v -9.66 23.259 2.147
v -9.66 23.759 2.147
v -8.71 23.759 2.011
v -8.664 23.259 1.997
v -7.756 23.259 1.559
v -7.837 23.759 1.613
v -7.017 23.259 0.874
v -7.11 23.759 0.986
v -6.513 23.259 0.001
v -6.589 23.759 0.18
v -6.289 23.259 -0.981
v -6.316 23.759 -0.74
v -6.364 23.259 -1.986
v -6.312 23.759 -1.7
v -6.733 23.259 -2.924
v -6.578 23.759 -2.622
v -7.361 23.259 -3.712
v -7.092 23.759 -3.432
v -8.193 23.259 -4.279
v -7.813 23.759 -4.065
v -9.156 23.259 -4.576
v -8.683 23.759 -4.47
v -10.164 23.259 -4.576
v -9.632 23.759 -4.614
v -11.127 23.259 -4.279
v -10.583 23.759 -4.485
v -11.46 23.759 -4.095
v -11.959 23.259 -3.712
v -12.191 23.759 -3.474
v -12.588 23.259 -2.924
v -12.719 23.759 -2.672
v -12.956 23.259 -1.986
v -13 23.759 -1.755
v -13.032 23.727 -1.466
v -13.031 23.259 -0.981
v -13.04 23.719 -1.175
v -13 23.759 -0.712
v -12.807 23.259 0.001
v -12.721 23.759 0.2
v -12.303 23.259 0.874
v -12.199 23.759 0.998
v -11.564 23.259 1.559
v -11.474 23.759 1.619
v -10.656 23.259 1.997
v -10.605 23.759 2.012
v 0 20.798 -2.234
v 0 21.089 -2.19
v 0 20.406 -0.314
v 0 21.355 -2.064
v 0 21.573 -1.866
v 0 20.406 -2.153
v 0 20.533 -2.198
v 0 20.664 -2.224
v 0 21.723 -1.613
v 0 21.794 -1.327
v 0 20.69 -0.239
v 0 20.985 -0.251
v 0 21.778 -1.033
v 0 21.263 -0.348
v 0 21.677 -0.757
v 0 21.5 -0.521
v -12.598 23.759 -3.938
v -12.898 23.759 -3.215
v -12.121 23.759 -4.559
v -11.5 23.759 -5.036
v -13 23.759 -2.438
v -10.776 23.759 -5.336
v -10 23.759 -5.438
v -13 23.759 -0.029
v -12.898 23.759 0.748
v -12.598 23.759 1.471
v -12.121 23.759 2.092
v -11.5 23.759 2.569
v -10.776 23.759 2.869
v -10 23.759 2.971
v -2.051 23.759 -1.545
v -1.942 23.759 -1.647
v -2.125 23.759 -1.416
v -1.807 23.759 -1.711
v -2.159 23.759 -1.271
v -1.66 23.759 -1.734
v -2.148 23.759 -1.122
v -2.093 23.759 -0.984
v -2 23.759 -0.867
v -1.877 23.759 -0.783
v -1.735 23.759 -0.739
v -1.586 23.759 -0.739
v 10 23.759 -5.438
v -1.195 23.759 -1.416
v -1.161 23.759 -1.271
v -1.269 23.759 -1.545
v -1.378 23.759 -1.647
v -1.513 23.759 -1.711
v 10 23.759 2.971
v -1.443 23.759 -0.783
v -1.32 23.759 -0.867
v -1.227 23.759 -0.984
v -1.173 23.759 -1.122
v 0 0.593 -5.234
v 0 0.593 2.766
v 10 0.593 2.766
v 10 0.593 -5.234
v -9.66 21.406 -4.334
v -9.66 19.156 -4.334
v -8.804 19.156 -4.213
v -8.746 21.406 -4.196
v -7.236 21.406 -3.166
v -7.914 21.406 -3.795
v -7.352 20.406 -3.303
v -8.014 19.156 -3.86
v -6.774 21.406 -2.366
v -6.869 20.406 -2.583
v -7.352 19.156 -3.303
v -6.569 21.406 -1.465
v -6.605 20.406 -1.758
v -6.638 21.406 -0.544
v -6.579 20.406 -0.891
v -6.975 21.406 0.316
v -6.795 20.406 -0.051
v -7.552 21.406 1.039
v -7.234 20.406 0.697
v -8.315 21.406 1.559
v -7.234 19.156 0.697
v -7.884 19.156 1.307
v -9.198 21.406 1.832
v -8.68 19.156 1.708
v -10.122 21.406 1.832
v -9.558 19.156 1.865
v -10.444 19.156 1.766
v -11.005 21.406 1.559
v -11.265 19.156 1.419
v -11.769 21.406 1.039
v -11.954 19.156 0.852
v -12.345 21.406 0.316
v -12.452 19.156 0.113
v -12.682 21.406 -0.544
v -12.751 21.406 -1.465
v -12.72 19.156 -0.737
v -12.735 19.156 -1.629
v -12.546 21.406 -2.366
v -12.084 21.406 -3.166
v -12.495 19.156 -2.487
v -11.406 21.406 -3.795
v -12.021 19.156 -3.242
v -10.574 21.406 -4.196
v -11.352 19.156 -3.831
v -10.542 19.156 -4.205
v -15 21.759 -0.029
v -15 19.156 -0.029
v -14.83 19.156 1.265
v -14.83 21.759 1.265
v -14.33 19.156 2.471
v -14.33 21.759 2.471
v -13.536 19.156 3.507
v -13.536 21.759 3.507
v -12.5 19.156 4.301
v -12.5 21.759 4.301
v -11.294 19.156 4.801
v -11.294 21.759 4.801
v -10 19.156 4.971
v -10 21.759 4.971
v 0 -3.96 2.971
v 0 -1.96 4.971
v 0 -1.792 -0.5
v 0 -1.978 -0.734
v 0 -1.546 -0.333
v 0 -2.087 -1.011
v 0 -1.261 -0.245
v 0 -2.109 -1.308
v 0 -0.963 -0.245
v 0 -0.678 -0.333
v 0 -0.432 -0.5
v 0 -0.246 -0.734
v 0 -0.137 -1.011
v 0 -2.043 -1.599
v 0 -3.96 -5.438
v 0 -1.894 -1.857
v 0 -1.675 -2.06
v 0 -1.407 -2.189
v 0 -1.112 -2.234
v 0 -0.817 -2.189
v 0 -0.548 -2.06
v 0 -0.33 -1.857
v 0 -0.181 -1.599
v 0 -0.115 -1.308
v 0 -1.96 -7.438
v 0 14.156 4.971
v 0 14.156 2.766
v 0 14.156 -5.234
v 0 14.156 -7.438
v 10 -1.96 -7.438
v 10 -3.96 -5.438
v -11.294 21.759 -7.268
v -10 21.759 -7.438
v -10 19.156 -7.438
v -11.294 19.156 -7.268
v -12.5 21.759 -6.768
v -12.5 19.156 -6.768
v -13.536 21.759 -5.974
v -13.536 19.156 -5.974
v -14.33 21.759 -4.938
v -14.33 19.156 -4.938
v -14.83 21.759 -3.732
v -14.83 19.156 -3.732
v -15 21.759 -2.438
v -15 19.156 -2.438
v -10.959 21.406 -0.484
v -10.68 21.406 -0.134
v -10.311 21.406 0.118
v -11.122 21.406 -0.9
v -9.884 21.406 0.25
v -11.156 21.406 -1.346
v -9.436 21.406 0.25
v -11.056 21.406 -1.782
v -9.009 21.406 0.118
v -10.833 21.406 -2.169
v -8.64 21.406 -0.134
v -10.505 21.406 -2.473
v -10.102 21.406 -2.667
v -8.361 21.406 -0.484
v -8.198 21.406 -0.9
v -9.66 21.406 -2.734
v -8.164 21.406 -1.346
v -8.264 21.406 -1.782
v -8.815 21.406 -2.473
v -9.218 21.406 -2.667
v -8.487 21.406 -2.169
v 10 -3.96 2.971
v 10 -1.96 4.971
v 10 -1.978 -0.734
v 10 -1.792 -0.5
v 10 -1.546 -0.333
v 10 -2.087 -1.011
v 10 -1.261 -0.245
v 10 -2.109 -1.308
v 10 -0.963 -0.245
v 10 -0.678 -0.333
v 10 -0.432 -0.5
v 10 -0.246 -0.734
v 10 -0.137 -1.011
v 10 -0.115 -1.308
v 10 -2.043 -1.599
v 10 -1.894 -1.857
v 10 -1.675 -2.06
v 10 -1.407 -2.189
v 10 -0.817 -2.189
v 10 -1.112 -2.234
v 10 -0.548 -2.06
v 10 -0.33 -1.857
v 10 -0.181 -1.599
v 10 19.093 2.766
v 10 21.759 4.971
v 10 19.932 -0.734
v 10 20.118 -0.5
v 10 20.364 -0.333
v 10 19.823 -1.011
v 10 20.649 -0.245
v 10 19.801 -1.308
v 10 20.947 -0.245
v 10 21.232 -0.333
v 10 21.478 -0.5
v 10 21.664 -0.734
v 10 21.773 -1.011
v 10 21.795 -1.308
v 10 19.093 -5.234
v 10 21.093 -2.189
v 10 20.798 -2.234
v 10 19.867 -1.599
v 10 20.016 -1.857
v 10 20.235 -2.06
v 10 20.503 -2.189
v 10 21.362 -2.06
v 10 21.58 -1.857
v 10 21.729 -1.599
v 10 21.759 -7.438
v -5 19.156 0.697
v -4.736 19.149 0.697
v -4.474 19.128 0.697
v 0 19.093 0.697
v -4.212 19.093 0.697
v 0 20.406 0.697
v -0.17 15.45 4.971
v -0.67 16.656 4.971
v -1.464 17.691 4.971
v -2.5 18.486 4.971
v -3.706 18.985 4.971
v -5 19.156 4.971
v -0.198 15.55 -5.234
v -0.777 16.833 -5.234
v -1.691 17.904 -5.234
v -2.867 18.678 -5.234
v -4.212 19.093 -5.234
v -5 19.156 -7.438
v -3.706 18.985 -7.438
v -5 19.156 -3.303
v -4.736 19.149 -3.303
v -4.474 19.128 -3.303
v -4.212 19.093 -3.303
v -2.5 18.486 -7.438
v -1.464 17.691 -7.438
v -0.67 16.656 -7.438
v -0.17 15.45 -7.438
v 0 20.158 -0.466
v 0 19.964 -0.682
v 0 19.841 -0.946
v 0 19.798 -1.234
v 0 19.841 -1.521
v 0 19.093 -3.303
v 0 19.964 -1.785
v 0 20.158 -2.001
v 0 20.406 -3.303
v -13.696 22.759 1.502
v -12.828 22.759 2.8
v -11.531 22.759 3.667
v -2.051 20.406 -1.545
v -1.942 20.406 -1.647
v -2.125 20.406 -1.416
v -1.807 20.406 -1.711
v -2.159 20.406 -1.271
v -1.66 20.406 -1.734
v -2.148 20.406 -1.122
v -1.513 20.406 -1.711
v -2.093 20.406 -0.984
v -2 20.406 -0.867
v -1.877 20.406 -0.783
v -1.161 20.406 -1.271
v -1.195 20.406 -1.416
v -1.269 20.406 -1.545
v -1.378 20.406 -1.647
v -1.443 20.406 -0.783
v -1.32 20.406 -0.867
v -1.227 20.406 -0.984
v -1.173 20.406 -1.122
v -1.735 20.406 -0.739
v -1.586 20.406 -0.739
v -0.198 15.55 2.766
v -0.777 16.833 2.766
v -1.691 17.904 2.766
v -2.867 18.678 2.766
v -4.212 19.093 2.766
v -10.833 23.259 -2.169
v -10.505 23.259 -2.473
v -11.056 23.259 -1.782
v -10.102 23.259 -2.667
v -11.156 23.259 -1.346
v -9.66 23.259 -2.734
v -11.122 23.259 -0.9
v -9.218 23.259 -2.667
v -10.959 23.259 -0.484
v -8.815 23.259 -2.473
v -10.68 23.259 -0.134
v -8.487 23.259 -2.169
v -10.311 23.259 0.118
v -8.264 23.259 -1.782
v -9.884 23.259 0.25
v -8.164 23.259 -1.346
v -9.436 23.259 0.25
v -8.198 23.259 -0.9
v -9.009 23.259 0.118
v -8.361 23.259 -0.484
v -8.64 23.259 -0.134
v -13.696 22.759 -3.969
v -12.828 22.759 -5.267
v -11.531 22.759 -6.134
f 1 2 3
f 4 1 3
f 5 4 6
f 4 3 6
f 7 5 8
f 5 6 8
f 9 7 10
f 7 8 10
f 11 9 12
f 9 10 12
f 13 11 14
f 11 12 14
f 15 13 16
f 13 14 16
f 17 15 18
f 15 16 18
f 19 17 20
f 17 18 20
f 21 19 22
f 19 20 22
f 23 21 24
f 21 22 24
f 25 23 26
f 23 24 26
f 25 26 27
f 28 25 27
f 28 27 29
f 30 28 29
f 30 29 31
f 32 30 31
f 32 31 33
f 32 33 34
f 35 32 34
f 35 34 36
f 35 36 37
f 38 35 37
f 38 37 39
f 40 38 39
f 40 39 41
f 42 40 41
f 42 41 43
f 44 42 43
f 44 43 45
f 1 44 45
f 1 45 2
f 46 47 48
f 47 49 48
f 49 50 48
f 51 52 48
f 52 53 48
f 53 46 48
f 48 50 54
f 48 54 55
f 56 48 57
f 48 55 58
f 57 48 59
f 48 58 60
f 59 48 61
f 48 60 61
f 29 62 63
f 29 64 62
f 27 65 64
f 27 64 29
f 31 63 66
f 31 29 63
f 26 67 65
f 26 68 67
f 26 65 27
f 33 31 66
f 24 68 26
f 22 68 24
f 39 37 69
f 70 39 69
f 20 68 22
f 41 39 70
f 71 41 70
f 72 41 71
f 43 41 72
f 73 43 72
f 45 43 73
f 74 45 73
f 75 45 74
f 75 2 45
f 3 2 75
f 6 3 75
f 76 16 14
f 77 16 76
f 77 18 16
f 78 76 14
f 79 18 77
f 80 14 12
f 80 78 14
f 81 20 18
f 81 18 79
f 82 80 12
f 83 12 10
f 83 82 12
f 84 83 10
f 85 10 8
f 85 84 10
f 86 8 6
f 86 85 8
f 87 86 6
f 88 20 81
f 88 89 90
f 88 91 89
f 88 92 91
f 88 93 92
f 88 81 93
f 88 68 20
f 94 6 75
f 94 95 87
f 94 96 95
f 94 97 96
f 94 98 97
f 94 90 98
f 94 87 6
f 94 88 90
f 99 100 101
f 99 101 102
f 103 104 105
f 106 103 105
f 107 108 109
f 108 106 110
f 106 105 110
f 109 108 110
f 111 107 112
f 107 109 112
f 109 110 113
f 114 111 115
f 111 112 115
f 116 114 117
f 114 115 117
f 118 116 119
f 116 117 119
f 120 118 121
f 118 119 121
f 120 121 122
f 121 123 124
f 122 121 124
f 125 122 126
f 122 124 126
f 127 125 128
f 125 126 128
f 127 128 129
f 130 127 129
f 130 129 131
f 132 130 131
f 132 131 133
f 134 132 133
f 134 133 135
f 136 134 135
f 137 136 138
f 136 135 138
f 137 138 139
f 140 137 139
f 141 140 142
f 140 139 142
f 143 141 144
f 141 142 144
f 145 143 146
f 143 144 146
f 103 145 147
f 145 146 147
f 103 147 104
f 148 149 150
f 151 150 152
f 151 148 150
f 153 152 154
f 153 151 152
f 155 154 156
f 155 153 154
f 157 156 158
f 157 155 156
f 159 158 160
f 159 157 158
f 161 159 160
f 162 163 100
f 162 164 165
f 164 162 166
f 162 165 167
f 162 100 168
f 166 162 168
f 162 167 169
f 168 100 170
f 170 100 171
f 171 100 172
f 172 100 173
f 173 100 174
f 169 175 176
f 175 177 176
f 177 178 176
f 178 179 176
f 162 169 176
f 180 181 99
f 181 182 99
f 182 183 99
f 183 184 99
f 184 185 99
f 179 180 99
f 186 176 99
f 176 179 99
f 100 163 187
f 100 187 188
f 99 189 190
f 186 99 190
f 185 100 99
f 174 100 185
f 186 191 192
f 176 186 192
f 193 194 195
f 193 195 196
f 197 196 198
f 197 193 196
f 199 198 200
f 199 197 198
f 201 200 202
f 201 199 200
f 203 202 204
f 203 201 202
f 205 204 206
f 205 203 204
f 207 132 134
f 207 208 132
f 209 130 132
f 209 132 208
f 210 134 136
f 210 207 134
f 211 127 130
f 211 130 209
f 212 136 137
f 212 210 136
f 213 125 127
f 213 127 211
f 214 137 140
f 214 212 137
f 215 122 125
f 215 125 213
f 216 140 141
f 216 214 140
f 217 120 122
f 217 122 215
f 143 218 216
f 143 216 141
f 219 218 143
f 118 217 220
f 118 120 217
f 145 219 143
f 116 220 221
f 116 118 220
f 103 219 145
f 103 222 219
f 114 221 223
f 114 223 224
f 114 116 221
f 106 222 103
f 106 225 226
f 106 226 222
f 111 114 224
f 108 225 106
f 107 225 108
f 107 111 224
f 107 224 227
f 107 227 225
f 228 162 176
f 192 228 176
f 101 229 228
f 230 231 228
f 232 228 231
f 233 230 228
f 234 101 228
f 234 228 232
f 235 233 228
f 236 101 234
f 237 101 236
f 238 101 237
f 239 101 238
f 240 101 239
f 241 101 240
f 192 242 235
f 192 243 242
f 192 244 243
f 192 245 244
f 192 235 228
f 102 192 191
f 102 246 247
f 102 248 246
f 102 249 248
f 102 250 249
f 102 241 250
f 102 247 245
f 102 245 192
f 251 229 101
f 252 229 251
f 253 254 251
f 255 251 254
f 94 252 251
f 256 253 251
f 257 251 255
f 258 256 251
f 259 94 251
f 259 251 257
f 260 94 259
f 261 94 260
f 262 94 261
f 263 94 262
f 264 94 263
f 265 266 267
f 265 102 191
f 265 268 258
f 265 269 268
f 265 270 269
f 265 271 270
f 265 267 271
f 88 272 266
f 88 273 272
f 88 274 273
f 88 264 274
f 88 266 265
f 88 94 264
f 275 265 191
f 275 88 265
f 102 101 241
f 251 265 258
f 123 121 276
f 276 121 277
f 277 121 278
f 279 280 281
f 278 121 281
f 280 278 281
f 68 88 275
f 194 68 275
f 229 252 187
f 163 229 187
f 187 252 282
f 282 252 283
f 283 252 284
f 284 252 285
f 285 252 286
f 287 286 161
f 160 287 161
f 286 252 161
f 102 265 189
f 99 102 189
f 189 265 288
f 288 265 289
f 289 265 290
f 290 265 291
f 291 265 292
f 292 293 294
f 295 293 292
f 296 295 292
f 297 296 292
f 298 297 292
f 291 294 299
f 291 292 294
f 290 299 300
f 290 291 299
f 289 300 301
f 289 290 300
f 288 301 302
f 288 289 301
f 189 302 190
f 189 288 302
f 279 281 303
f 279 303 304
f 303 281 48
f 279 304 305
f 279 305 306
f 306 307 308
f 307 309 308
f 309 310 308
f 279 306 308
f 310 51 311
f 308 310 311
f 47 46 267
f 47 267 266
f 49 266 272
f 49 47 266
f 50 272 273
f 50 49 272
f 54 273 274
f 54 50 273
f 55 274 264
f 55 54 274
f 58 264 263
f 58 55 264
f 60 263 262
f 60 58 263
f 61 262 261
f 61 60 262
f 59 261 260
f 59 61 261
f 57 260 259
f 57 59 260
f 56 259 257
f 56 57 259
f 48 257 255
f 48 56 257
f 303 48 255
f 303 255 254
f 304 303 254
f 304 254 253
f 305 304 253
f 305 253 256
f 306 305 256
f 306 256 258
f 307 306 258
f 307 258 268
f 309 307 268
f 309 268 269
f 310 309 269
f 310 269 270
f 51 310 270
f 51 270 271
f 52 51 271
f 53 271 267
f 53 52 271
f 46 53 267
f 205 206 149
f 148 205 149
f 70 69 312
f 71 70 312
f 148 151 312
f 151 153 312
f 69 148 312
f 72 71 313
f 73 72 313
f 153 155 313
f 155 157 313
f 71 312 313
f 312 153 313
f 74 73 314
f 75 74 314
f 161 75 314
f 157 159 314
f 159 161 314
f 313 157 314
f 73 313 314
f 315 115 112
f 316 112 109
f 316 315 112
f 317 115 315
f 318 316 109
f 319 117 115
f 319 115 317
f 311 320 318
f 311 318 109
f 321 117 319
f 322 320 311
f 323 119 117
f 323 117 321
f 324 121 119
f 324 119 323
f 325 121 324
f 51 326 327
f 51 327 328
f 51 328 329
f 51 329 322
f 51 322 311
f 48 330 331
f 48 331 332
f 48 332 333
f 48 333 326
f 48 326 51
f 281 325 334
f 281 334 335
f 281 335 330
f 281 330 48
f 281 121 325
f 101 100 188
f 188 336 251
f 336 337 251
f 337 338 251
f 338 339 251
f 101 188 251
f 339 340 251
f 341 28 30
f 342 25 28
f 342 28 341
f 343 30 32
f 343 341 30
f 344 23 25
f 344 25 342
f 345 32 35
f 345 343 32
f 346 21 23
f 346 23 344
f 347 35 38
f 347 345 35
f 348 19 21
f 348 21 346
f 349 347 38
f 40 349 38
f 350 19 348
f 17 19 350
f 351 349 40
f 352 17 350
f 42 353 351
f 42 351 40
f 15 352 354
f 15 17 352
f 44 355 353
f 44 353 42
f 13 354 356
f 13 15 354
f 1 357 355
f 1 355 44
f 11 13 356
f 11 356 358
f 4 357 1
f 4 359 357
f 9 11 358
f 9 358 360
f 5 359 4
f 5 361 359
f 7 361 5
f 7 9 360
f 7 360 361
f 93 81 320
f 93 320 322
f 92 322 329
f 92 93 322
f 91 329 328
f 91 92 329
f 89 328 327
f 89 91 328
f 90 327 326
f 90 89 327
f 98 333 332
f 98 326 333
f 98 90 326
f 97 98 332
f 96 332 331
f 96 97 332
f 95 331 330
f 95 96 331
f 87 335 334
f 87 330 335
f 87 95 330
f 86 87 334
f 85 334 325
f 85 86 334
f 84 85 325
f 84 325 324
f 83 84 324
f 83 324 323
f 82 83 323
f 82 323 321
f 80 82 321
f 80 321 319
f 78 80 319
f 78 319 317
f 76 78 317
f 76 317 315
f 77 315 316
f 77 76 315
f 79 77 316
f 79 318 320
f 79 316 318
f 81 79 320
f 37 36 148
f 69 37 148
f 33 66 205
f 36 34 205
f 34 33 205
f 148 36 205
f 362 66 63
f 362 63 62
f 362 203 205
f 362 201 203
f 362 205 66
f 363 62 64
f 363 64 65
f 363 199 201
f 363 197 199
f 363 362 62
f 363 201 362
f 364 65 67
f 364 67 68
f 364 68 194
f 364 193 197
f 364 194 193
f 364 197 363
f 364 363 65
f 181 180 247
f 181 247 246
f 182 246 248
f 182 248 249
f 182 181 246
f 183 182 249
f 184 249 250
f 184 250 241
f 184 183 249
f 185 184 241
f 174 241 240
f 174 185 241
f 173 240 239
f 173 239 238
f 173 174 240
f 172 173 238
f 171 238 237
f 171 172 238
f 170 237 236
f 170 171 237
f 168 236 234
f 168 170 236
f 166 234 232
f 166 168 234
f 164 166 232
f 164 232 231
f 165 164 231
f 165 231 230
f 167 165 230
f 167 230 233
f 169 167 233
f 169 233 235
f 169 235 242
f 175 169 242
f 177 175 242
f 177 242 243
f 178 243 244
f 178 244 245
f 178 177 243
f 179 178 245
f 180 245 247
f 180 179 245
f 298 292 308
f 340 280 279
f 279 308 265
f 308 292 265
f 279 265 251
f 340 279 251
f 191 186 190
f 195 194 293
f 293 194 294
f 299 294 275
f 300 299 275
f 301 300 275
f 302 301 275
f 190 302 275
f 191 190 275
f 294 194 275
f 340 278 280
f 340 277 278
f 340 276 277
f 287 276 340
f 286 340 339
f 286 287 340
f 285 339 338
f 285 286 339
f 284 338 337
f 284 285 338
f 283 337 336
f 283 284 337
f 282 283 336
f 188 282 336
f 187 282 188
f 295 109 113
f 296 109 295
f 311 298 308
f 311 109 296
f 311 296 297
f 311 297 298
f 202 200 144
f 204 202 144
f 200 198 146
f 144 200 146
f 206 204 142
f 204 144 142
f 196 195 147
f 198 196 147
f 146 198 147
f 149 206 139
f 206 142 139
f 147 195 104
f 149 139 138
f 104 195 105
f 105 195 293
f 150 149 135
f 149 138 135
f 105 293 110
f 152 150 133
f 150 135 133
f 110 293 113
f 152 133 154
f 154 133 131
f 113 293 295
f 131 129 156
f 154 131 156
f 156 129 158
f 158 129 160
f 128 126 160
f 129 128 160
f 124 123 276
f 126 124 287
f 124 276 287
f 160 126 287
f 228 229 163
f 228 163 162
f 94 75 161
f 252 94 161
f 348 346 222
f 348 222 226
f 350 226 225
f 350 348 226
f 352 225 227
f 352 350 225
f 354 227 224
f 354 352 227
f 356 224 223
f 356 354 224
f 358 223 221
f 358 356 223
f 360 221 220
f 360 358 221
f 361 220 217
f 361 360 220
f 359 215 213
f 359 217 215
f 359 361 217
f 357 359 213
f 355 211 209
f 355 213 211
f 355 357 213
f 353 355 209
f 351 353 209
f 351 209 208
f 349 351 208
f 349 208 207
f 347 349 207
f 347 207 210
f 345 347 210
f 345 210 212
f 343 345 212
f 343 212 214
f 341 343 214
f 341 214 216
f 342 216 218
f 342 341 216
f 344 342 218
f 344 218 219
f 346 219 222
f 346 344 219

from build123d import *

# Parameters (mm, degrees)
SKETCH1_W               = 12.409227922
SKETCH1_H               = 27.718567262
SKETCH1_R               = 1
SKETCH1_W_2             = 8
SKETCH1_H_2             = 18.5
BOSS_EXTRUDE1_DEPTH     = 10
SKETCH6_W               = 12.409227922
SKETCH6_H               = 4.603346058
BOSS_EXTRUDE3_DEPTH     = 15
SKETCH7_R               = 3.1
CUT_EXTRUDE4_DEPTH      = 2.25
SKETCH8_W               = 11.323212184
SKETCH8_H               = 4
CUT_EXTRUDE5_DEPTH      = 1.25
CUT_EXTRUDE7_DEPTH      = 31.392767012
CUT_EXTRUDE7_DEPTH_BACK = 31.392767012
SKETCH9_R               = 1.5
SKETCH9_R_2             = 0.5
FILLET2_R               = 5
SKETCH10_R              = 3.380365375
CUT_EXTRUDE8_DEPTH      = 0.5
CHAMFER3_SIZE           = 2
FILLET3_R               = 5


with BuildPart() as part:
    # Sketch1 → Boss-Extrude1 (new body)
    with BuildSketch(Plane(origin=(0, 0, 0), x_dir=(0, 0, -1), z_dir=(1, 0, 0))):
        with Locations((1.233520205, 9.89974551)):
            Rectangle(SKETCH1_W, SKETCH1_H)
        with Locations((1.233520205, 20.798227972)):
            Circle(SKETCH1_R, mode=Mode.SUBTRACT)
        with Locations((1.233520205, -1.111772028)):
            Circle(SKETCH1_R, mode=Mode.SUBTRACT)
        with Locations((1.233520205, 9.843227972)):
            Rectangle(SKETCH1_W_2, SKETCH1_H_2, mode=Mode.SUBTRACT)
    extrude(amount=BOSS_EXTRUDE1_DEPTH)

    # Sketch6 → Boss-Extrude3 (add)
    with BuildSketch(Plane.ZY):
        with Locations((-1.233520205, 21.457356112)):
            Rectangle(SKETCH6_W, SKETCH6_H)
    extrude(amount=BOSS_EXTRUDE3_DEPTH)

    # Sketch7 → Cut-Extrude4 (cut)
    with BuildSketch(Plane.XZ.offset(-19.155683083)):
        with Locations(Location((-9.660045294, -1.233520205, 0), (0, 0, 270))):
            Circle(SKETCH7_R)
    extrude(amount=-CUT_EXTRUDE4_DEPTH, mode=Mode.SUBTRACT)

    # Sketch8 → Cut-Extrude5 (cut)
    with BuildSketch(Plane.XZ.offset(-19.155683083)):
        with Locations((-5.661606092, -1.303442539)):
            Rectangle(SKETCH8_W, SKETCH8_H)
    extrude(amount=-CUT_EXTRUDE5_DEPTH, mode=Mode.SUBTRACT)

    # Sketch9 → Cut-Extrude7 (cut, two sides: drawn at the far end of the back side and taken through both)
    with BuildSketch(Plane.XZ.offset(-21.405683083).offset(-CUT_EXTRUDE7_DEPTH_BACK)):
        with Locations(Location((-9.660045294, -1.233520205, 0), (0, 0, 270))):
            Circle(SKETCH9_R)
        with Locations(Location((-1.660045294, -1.233520205, 0), (0, 0, 270))):
            Circle(SKETCH9_R_2)
    extrude(amount=CUT_EXTRUDE7_DEPTH + CUT_EXTRUDE7_DEPTH_BACK, mode=Mode.SUBTRACT)

    # Fillet2
    fillet2_edges = [part.edges().sort_by_distance(p)[0] for p in [
        (-15, 21.457356112, -7.438134166),
        (-15, 21.457356112, 4.971093756),
    ]]
    fillet(fillet2_edges, radius=FILLET2_R)

    # Sketch10 → Cut-Extrude8 (cut)
    with BuildSketch(Plane(origin=(0, 23.759029141, 0), x_dir=(1, 0, 0), z_dir=(0, 1, 0))):
        with Locations(Location((-9.660045294, 1.233520205, 0), (0, 0, 270))):
            Circle(SKETCH10_R)
    extrude(amount=-CUT_EXTRUDE8_DEPTH, mode=Mode.SUBTRACT)

    # Chamfer3
    # the kernel refuses this chamfer: 2 mm, written as the material it takes off along each edge
    with BuildSketch(Plane(origin=(-5.143365976, -3.959538121, -7.438134166), x_dir=(0, 0.9996219169112968, -0.027495876610586487), z_dir=(1, 0, 0))) as chamfer3_piece_1:
        Polygon((CHAMFER3_SIZE * 0.999621916911, CHAMFER3_SIZE * 0.0274958766106), (-CHAMFER3_SIZE * 0.0274958766106, CHAMFER3_SIZE * 0.999621916911), (0, 0), align=None)
    extrude(amount=20.286731952, mode=Mode.SUBTRACT)
    with BuildSketch(Plane(origin=(-5.143365976, -3.959538121, 4.971093756), x_dir=(0, 0.9996219169112968, 0.027495876610586487), z_dir=(1, 0, 0))) as chamfer3_piece_2:
        Polygon((CHAMFER3_SIZE * 0.999621916911, -CHAMFER3_SIZE * 0.0274958766106), (-CHAMFER3_SIZE * 0.0274958766106, -CHAMFER3_SIZE * 0.999621916911), (0, 0), align=None)
    extrude(amount=20.286731952, mode=Mode.SUBTRACT)
    with BuildSketch(Plane(origin=(-10, 23.759029141, 4.971093756), x_dir=(0, 0.02749587661058563, -0.9996219169112968), z_dir=(1, 0, 0)), Plane(origin=(15.143365976, 23.759029141, -7.438134166), x_dir=(0, 0.027495876610585623, 0.9996219169112968), z_dir=(-1, 0, 0))) as chamfer3_piece_3:
        Polygon((CHAMFER3_SIZE * 0.999621916911, -CHAMFER3_SIZE * 0.0274958766106), (-CHAMFER3_SIZE * 0.0274958766106, -CHAMFER3_SIZE * 0.999621916911), (0, 0), align=None)
    extrude(amount=25.143365976, mode=Mode.SUBTRACT)
    with BuildSketch(Plane(origin=(-15, 23.759029141, -2.438134166), x_dir=(0.9996219169112968, 0.027495876610585623, 0), z_dir=(0, 0, 1))) as chamfer3_piece_4:
        Polygon((CHAMFER3_SIZE * 0.999621916911, -CHAMFER3_SIZE * 0.0274958766106), (-CHAMFER3_SIZE * 0.0274958766106, -CHAMFER3_SIZE * 0.999621916911), (0, 0), align=None)
    extrude(amount=2.409227923, mode=Mode.SUBTRACT)
    with BuildSketch(Plane(origin=(-10, 23.759029141, -0.028906244), x_dir=(-1, 0, 0), z_dir=(0, 0, -1))) as chamfer3_piece_5:
        Polygon((5 - CHAMFER3_SIZE, 0), (5, -CHAMFER3_SIZE), (5, 0), align=None)
    revolve(axis=Axis((-10, 23.759029141, -0.028906244), (0, 1, 0)), revolution_arc=90, mode=Mode.SUBTRACT)
    with BuildSketch(Plane(origin=(-10, 23.759029141, -2.438134166), x_dir=(-1, 0, 0), z_dir=(0, 0, 1))) as chamfer3_piece_6:
        Polygon((5 - CHAMFER3_SIZE, 0), (5, CHAMFER3_SIZE), (5, 0), align=None)
    revolve(axis=Axis((-10, 23.759029141, -2.438134166), (0, -1, 0)), revolution_arc=90, mode=Mode.SUBTRACT)

    # Fillet3
    # the kernel refuses this fillet: 5 mm, written as the material it adds along each edge
    with BuildSketch(Plane(origin=(0, 19.155683083, 9.196557461), x_dir=(-1, 0, 0), z_dir=(0, 0, -1))) as fillet3_piece_1_section:
        with BuildLine():
            CenterArc((FILLET3_R, -FILLET3_R), FILLET3_R, 90, 90)
            Line((0, -FILLET3_R), (0, 0))
            Line((0, 0), (FILLET3_R, 0))
        make_face()
    fillet3_piece_1 = extrude(amount=29.134691627, mode=Mode.PRIVATE)
    fillet3_piece_1 = split(fillet3_piece_1, bisect_by=Plane(origin=(-2.240914142, 19.125188019, 4.971093756), z_dir=(0, 0, -1)), keep=Keep.TOP, mode=Mode.PRIVATE)
    fillet3_piece_1 = split(fillet3_piece_1, bisect_by=Plane(origin=(-2.240914142, 19.093227972, 3.868786776), z_dir=(0, 1, 0)), keep=Keep.TOP, mode=Mode.PRIVATE)
    fillet3_piece_1 = split(fillet3_piece_1, bisect_by=Plane(origin=(-2.240914142, 19.125188019, 0.696557461), z_dir=(0, 0, 1)), keep=Keep.TOP, mode=Mode.PRIVATE)
    add(fillet3_piece_1)
    with BuildSketch(Plane(origin=(0, 19.155683083, 9.196557461), x_dir=(-1, 0, 0), z_dir=(0, 0, -1))) as fillet3_piece_2_section:
        with BuildLine():
            CenterArc((FILLET3_R, -FILLET3_R), FILLET3_R, 90, 90)
            Line((0, -FILLET3_R), (0, 0))
            Line((0, 0), (FILLET3_R, 0))
        make_face()
    fillet3_piece_2 = extrude(amount=29.134691627, mode=Mode.PRIVATE)
    fillet3_piece_2 = split(fillet3_piece_2, bisect_by=Plane(origin=(-1.055076688, 17.979153471, 4.971093756), z_dir=(0, 0, -1)), keep=Keep.TOP, mode=Mode.PRIVATE)
    fillet3_piece_2 = split(fillet3_piece_2, bisect_by=Plane(origin=(-1.055076688, 17.979153471, 2.766479795), z_dir=(0, 0, 1)), keep=Keep.TOP, mode=Mode.PRIVATE)
    add(fillet3_piece_2)
    with BuildSketch(Plane(origin=(0, 19.155683083, -3.303442539), x_dir=(-1, 0, 0), z_dir=(0, 0, -1))) as fillet3_piece_3_section:
        with BuildLine():
            CenterArc((FILLET3_R, -FILLET3_R), FILLET3_R, 90, 90)
            Line((0, -FILLET3_R), (0, 0))
            Line((0, 0), (FILLET3_R, 0))
        make_face()
    fillet3_piece_3 = extrude(amount=4.134691627, mode=Mode.PRIVATE)
    fillet3_piece_3 = split(fillet3_piece_3, bisect_by=Plane(origin=(-2.240914142, 19.093227972, -4.268481372), z_dir=(0, 1, 0)), keep=Keep.TOP, mode=Mode.PRIVATE)
    add(fillet3_piece_3)
    with BuildSketch(Plane(origin=(0, 19.155683083, 9.196557461), x_dir=(-1, 0, 0), z_dir=(0, 0, -1))) as fillet3_piece_4_section:
        with BuildLine():
            CenterArc((FILLET3_R, -FILLET3_R), FILLET3_R, 90, 90)
            Line((0, -FILLET3_R), (0, 0))
            Line((0, 0), (FILLET3_R, 0))
        make_face()
    fillet3_piece_4 = extrude(amount=16.634691627, mode=Mode.PRIVATE)
    fillet3_piece_4 = split(fillet3_piece_4, bisect_by=Plane(origin=(-1.055076688, 17.979153471, -5.233520205), z_dir=(0, 0, -1)), keep=Keep.TOP, mode=Mode.PRIVATE)
    add(fillet3_piece_4)
    with BuildSketch(Plane(origin=(0, 19.155683083, 4.971093756), x_dir=(-1, 0, 0), z_dir=(0, 0, -1))) as fillet3_piece_5_section:
        with BuildLine():
            CenterArc((FILLET3_R, -FILLET3_R), FILLET3_R, 90, 90)
            Line((0, -FILLET3_R), (0, 0))
            Line((0, 0), (FILLET3_R, 0))
        make_face()
    fillet3_piece_5 = extrude(amount=4.274536296, mode=Mode.PRIVATE)
    fillet3_piece_5 = split(fillet3_piece_5, bisect_by=Plane(origin=(-2.240914142, 19.093227972, 3.868786776), z_dir=(0, 1, 0)), keep=Keep.TOP, mode=Mode.PRIVATE)
    add(fillet3_piece_5)
    with BuildSketch(Plane(origin=(0, 19.155683083, 4.971093756), x_dir=(-1, 0, 0), z_dir=(0, 0, -1))) as fillet3_piece_6_section:
        with BuildLine():
            CenterArc((FILLET3_R, -FILLET3_R), FILLET3_R, 90, 90)
            Line((0, -FILLET3_R), (0, 0))
            Line((0, 0), (FILLET3_R, 0))
        make_face()
    fillet3_piece_6 = extrude(amount=16.774536296, mode=Mode.PRIVATE)
    fillet3_piece_6 = split(fillet3_piece_6, bisect_by=Plane(origin=(-1.055076688, 17.979153471, 2.766479795), z_dir=(0, 0, 1)), keep=Keep.TOP, mode=Mode.PRIVATE)
    add(fillet3_piece_6)
    with BuildSketch(Plane(origin=(0, 19.155683083, 17.471093756), x_dir=(-1, 0, 0), z_dir=(0, 0, -1))) as fillet3_piece_7_section:
        with BuildLine():
            CenterArc((FILLET3_R, -FILLET3_R), FILLET3_R, 90, 90)
            Line((0, -FILLET3_R), (0, 0))
            Line((0, 0), (FILLET3_R, 0))
        make_face()
    fillet3_piece_7 = extrude(amount=29.274536296, mode=Mode.PRIVATE)
    fillet3_piece_7 = split(fillet3_piece_7, bisect_by=Plane(origin=(-2.240914142, 19.125188019, -7.438134166), z_dir=(0, 0, 1)), keep=Keep.TOP, mode=Mode.PRIVATE)
    fillet3_piece_7 = split(fillet3_piece_7, bisect_by=Plane(origin=(-2.240914142, 19.093227972, -4.268481372), z_dir=(0, 1, 0)), keep=Keep.TOP, mode=Mode.PRIVATE)
    fillet3_piece_7 = split(fillet3_piece_7, bisect_by=Plane(origin=(-2.240914142, 19.125188019, -3.303442539), z_dir=(0, 0, -1)), keep=Keep.TOP, mode=Mode.PRIVATE)
    add(fillet3_piece_7)
    with BuildSketch(Plane(origin=(0, 19.155683083, 17.471093756), x_dir=(-1, 0, 0), z_dir=(0, 0, -1))) as fillet3_piece_8_section:
        with BuildLine():
            CenterArc((FILLET3_R, -FILLET3_R), FILLET3_R, 90, 90)
            Line((0, -FILLET3_R), (0, 0))
            Line((0, 0), (FILLET3_R, 0))
        make_face()
    fillet3_piece_8 = extrude(amount=29.274536296, mode=Mode.PRIVATE)
    fillet3_piece_8 = split(fillet3_piece_8, bisect_by=Plane(origin=(-1.055076688, 17.979153471, -7.438134166), z_dir=(0, 0, 1)), keep=Keep.TOP, mode=Mode.PRIVATE)
    fillet3_piece_8 = split(fillet3_piece_8, bisect_by=Plane(origin=(-1.055076688, 17.979153471, -5.233520205), z_dir=(0, 0, -1)), keep=Keep.TOP, mode=Mode.PRIVATE)
    add(fillet3_piece_8)


solid = part.part
